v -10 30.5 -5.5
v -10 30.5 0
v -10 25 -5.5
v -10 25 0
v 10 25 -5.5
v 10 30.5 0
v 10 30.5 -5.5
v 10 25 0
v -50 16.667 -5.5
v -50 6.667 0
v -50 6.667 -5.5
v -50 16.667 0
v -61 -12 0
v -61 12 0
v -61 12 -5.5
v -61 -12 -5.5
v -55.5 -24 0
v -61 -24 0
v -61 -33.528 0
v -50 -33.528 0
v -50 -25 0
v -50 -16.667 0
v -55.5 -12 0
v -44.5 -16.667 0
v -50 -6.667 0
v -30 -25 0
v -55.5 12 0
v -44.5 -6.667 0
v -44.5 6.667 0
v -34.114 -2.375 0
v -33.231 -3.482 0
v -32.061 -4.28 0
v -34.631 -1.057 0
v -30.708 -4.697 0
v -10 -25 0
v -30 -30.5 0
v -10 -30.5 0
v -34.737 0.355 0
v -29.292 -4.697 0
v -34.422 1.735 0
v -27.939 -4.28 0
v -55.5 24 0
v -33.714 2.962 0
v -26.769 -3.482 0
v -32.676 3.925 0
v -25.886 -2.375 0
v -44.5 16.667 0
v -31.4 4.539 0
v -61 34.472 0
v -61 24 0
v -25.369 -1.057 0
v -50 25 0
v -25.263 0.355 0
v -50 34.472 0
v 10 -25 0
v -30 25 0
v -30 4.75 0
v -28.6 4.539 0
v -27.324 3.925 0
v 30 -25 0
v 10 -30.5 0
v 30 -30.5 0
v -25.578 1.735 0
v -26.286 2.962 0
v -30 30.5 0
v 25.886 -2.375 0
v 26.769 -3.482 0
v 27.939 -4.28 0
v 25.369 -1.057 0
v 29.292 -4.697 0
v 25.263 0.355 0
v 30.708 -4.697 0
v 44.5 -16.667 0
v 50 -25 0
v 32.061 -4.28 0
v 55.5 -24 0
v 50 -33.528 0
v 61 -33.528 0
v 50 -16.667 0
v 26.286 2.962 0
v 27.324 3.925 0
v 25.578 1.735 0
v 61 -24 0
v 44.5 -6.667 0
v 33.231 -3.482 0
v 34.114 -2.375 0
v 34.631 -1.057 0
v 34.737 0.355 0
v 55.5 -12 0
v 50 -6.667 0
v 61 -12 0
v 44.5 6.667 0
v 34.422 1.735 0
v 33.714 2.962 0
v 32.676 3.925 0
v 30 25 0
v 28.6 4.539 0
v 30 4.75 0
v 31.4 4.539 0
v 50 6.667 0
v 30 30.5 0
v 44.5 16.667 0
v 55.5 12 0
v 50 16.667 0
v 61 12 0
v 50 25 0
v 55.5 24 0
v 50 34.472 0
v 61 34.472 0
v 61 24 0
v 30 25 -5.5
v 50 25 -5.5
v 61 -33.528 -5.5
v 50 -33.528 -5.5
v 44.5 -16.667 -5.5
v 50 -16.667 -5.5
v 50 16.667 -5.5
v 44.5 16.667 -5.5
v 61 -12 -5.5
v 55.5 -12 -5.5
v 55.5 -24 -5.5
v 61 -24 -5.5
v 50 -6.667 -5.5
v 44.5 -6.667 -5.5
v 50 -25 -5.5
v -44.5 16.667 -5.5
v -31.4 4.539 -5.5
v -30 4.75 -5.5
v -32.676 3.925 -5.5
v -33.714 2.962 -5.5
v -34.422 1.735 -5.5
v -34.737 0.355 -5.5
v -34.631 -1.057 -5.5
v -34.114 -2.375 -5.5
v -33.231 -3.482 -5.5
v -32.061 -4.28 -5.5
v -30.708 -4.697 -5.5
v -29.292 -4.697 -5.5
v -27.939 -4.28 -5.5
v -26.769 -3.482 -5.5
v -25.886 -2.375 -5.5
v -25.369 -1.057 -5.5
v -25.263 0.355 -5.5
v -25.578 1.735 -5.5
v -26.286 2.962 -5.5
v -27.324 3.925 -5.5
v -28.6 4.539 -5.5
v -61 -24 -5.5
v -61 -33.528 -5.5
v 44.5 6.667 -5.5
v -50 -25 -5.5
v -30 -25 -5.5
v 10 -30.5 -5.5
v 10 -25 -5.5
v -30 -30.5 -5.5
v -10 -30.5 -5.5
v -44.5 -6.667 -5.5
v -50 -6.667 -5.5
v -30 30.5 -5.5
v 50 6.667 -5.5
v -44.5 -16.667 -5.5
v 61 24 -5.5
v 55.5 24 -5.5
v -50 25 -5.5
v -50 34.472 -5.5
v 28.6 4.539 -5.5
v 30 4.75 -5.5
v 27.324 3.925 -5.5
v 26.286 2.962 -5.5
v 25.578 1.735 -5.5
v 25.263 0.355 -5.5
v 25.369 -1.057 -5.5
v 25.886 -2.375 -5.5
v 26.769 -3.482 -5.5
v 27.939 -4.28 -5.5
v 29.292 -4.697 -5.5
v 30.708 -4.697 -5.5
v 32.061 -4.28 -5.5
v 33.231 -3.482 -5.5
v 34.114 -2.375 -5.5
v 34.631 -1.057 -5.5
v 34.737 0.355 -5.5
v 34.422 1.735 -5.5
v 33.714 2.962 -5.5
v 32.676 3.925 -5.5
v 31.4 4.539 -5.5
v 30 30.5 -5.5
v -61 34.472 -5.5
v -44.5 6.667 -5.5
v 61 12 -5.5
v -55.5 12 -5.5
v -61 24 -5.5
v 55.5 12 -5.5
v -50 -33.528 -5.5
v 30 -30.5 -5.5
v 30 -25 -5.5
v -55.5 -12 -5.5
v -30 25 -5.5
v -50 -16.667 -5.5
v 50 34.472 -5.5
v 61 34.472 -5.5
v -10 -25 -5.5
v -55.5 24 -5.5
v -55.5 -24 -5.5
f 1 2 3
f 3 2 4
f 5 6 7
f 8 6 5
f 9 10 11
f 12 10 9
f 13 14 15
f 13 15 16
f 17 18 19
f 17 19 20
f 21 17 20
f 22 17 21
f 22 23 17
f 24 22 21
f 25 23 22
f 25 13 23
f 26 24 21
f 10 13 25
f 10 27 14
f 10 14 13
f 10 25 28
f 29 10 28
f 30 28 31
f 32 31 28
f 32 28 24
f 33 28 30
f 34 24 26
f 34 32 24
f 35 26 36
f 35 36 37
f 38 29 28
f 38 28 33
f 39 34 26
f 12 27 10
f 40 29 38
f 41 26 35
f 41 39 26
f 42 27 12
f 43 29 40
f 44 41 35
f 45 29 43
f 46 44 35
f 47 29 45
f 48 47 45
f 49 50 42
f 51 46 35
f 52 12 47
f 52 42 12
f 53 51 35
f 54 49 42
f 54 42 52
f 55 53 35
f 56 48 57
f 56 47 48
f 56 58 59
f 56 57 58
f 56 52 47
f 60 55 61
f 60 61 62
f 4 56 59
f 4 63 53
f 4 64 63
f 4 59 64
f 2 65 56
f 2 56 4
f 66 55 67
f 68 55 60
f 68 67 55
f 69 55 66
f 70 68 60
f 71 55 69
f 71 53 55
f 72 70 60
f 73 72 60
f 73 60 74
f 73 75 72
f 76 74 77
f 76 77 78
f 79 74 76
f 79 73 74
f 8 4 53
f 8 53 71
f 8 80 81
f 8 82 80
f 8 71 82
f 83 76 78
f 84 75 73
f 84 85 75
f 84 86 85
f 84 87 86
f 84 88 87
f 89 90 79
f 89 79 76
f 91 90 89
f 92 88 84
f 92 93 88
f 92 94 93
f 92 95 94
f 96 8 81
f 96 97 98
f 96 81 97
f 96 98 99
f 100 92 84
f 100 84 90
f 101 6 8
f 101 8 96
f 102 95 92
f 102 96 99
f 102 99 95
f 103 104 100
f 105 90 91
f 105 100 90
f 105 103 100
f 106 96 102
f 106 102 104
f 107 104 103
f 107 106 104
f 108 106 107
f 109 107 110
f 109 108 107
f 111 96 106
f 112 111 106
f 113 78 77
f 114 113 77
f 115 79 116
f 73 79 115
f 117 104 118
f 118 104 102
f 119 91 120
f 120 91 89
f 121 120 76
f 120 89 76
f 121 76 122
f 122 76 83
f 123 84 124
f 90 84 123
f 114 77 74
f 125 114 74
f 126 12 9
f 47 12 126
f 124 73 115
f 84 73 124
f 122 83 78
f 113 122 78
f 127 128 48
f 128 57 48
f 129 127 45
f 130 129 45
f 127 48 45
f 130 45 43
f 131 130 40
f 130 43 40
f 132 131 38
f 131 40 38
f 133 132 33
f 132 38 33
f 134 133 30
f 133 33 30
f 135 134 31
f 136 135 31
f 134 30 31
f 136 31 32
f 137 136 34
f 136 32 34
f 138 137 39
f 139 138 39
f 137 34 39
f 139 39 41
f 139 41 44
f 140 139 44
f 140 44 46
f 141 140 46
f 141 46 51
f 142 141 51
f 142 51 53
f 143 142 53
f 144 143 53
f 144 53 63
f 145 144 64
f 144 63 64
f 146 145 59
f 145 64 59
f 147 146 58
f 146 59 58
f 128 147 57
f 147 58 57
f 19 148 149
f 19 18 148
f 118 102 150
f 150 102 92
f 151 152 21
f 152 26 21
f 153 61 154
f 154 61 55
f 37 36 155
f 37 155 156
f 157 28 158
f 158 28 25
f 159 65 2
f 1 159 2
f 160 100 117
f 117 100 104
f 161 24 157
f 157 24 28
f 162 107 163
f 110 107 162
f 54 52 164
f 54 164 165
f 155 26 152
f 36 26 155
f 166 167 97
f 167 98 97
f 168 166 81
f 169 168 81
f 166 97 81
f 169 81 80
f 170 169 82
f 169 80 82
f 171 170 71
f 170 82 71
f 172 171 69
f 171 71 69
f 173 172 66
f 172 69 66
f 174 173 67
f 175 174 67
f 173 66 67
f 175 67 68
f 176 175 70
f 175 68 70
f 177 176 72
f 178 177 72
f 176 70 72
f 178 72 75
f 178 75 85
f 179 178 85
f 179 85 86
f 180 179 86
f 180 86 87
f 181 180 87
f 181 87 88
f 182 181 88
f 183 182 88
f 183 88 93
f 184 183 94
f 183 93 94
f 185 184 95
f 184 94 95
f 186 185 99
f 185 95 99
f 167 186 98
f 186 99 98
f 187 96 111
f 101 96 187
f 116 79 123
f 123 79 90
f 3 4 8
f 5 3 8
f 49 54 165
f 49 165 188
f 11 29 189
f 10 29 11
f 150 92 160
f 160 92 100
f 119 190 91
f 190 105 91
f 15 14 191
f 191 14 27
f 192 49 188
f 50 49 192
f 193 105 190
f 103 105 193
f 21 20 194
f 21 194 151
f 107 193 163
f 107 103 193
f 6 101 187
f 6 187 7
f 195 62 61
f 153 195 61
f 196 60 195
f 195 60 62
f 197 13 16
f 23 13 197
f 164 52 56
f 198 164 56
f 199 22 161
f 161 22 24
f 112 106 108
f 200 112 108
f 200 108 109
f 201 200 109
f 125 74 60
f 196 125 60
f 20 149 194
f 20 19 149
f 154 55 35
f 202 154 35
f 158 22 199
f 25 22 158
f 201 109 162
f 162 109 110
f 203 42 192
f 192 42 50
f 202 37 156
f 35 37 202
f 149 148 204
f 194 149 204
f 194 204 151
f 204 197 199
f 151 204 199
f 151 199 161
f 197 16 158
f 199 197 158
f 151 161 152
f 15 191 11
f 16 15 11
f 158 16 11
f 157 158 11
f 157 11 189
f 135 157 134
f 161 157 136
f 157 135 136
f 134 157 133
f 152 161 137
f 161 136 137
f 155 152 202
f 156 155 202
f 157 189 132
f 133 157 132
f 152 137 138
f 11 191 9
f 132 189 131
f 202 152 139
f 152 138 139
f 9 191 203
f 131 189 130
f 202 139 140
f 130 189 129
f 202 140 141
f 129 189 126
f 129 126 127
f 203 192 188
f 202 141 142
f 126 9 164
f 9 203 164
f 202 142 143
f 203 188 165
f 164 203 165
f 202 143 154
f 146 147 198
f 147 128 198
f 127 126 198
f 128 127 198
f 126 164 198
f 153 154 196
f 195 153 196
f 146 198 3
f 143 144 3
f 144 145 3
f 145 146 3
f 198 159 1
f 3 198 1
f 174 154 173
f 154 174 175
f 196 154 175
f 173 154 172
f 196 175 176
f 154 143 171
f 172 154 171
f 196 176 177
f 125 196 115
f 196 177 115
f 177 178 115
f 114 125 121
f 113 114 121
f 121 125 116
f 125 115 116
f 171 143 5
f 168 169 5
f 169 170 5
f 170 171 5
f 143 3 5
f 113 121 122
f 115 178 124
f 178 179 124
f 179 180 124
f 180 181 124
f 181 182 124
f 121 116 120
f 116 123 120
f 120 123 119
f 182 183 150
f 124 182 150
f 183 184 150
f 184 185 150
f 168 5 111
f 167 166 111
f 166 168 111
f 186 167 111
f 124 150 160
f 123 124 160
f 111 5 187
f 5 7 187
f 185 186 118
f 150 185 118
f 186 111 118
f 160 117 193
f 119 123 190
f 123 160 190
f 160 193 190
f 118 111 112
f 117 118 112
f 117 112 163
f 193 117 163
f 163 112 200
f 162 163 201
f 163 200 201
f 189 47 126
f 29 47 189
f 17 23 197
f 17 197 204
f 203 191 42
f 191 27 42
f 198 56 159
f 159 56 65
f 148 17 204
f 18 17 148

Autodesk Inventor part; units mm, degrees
ref_plane "YZ Plane" through (0, 0, 0) normal (1, 0, 0) x (0, 1, 0)
ref_plane "XZ Plane" through (0, 0, 0) normal (0, 1, 0) x (-1, 0, 0)
ref_plane "XY Plane" through (0, 0, 0) normal (0, 0, 1) x (1, 0, 0)
sketch "Block1" plane through (0, 0, 0) normal (0, 0, 1) x (1, 0, 0)
  line L0 (-30.1, 34.1) -> (-9.9, 34.1)
  line L1 (-9.9, 34.1) -> (-9.9, 25.1)
  line L2 (-9.9, 25.1) -> (9.9, 25.1)
  line L3 (9.9, 25.1) -> (9.9, 34.1)
  line L4 (9.9, 34.1) -> (30.1, 34.1)
  line L5 (30.1, 34.1) -> (30.1, 25.1)
  line L6 (30.1, 25.1) -> (49.9, 25.1)
  line L7 (49.9, 25.1) -> (49.9, 34.5715)
  line L8 (49.9, 34.5715) -> (61.1, 34.5715)
  line L9 (61.1, 34.5715) -> (61.1, 23.9)
  line L10 (61.1, 23.9) -> (52.1, 23.9)
  line L11 (52.1, 23.9) -> (52.1, 12.1)
  line L12 (52.1, 12.1) -> (61.1, 12.1)
  line L13 (61.1, 12.1) -> (61.1, -12.1)
  line L14 (61.1, -12.1) -> (52.1, -12.1)
  line L15 (52.1, -12.1) -> (52.1, -23.9)
  line L16 (52.1, -23.9) -> (61.1, -23.9)
  line L17 (61.1, -23.9) -> (61.1, -33.6285)
  line L18 (61.1, -33.6285) -> (49.9, -33.6285)
  line L19 (49.9, -33.6285) -> (49.9, -25.1)
  line L20 (49.9, -25.1) -> (30.1, -25.1)
  line L21 (30.1, -25.1) -> (30.1, -34.1)
  line L22 (30.1, -34.1) -> (9.9, -34.1)
  line L23 (9.9, -34.1) -> (9.9, -25.1)
  line L24 (9.9, -25.1) -> (-9.9, -25.1)
  line L25 (-9.9, -25.1) -> (-9.9, -34.1)
  line L26 (-9.9, -34.1) -> (-30.1, -34.1)
  line L27 (-30.1, -34.1) -> (-30.1, -25.1)
  line L28 (-30.1, -25.1) -> (-49.9, -25.1)
  line L29 (-49.9, -25.1) -> (-49.9, -33.6285)
  line L30 (-49.9, -33.6285) -> (-61.1, -33.6285)
  line L31 (-61.1, -33.6285) -> (-61.1, -23.9)
  line L32 (-61.1, -23.9) -> (-52.1, -23.9)
  line L33 (-52.1, -23.9) -> (-52.1, -12.1)
  line L34 (-52.1, -12.1) -> (-61.1, -12.1)
  line L35 (-61.1, -12.1) -> (-61.1, 12.1)
  line L36 (-61.1, 12.1) -> (-52.1, 12.1)
  line L37 (-52.1, 12.1) -> (-52.1, 23.9)
  line L38 (-52.1, 23.9) -> (-61.1, 23.9)
  line L39 (-61.1, 23.9) -> (-61.1, 34.5715)
  line L40 (-61.1, 34.5715) -> (-49.9, 34.5715)
  line L41 (-49.9, 34.5715) -> (-49.9, 25.1)
  line L42 (-49.9, 25.1) -> (-30.1, 25.1)
  line L43 (-30.1, 25.1) -> (-30.1, 34.1)
  line L44 (-40.9, 16.7667) -> (-50.1, 16.7667)
  line L45 (-50.1, 16.7667) -> (-50.1, 6.5667)
  line L46 (-50.1, 6.5667) -> (-40.9, 6.5667)
  line L47 (-40.9, 6.5667) -> (-40.9, 16.7667)
  line L48 (-40.9, -6.5667) -> (-50.1, -6.5667)
  line L49 (-50.1, -6.5667) -> (-50.1, -16.7667)
  line L50 (-50.1, -16.7667) -> (-40.9, -16.7667)
  line L51 (-40.9, -16.7667) -> (-40.9, -6.5667)
  circle A0 centre (-30, 0) radius 4.6
  circle A1 centre (30, 0) radius 4.6
  line L52 (50.1, 16.7667) -> (50.1, 6.5667)
  line L53 (50.1, 6.5667) -> (40.9, 6.5667)
  line L54 (40.9, 6.5667) -> (40.9, 16.7667)
  line L55 (40.9, 16.7667) -> (50.1, 16.7667)
  line L56 (50.1, -6.5667) -> (40.9, -6.5667)
  line L57 (40.9, -6.5667) -> (40.9, -16.7667)
  line L58 (40.9, -16.7667) -> (50.1, -16.7667)
  line L59 (50.1, -16.7667) -> (50.1, -6.5667)
  point P0 (0, 0.0615)
sketch "Block2" plane through (0, 0, 0) normal (0, 0, 1) x (1, 0, 0)
  line L0 (-30.2, 34.2) -> (-9.8, 34.2)
  line L1 (-9.8, 34.2) -> (-9.8, 25.2)
  line L2 (-9.8, 25.2) -> (9.8, 25.2)
  line L3 (9.8, 25.2) -> (9.8, 34.2)
  line L4 (9.8, 34.2) -> (30.2, 34.2)
  line L5 (30.2, 34.2) -> (30.2, 25.2)
  line L6 (30.2, 25.2) -> (49.8, 25.2)
  line L7 (49.8, 25.2) -> (49.8, 34.6715)
  line L8 (49.8, 34.6715) -> (61.2, 34.6715)
  line L9 (61.2, 34.6715) -> (61.2, 23.8)
  line L10 (61.2, 23.8) -> (52.2, 23.8)
  line L11 (52.2, 23.8) -> (52.2, 12.2)
  line L12 (52.2, 12.2) -> (61.2, 12.2)
  line L13 (61.2, 12.2) -> (61.2, -12.2)
  line L14 (61.2, -12.2) -> (52.2, -12.2)
  line L15 (52.2, -12.2) -> (52.2, -23.8)
  line L16 (52.2, -23.8) -> (61.2, -23.8)
  line L17 (61.2, -23.8) -> (61.2, -33.7285)
  line L18 (61.2, -33.7285) -> (49.8, -33.7285)
  line L19 (49.8, -33.7285) -> (49.8, -25.2)
  line L20 (49.8, -25.2) -> (30.2, -25.2)
  line L21 (30.2, -25.2) -> (30.2, -34.2)
  line L22 (30.2, -34.2) -> (9.8, -34.2)
  line L23 (9.8, -34.2) -> (9.8, -25.2)
  line L24 (9.8, -25.2) -> (-9.8, -25.2)
  line L25 (-9.8, -25.2) -> (-9.8, -34.2)
  line L26 (-9.8, -34.2) -> (-30.2, -34.2)
  line L27 (-30.2, -34.2) -> (-30.2, -25.2)
  line L28 (-30.2, -25.2) -> (-49.8, -25.2)
  line L29 (-49.8, -25.2) -> (-49.8, -33.7285)
  line L30 (-49.8, -33.7285) -> (-61.2, -33.7285)
  line L31 (-61.2, -33.7285) -> (-61.2, -23.8)
  line L32 (-61.2, -23.8) -> (-52.2, -23.8)
  line L33 (-52.2, -23.8) -> (-52.2, -12.2)
  line L34 (-52.2, -12.2) -> (-61.2, -12.2)
  line L35 (-61.2, -12.2) -> (-61.2, 12.2)
  line L36 (-61.2, 12.2) -> (-52.2, 12.2)
  line L37 (-52.2, 12.2) -> (-52.2, 23.8)
  line L38 (-52.2, 23.8) -> (-61.2, 23.8)
  line L39 (-61.2, 23.8) -> (-61.2, 34.6715)
  line L40 (-61.2, 34.6715) -> (-49.8, 34.6715)
  line L41 (-49.8, 34.6715) -> (-49.8, 25.2)
  line L42 (-49.8, 25.2) -> (-30.2, 25.2)
  line L43 (-30.2, 25.2) -> (-30.2, 34.2)
  circle A0 centre (-30, 0) radius 4.7
  circle A1 centre (30, 0) radius 4.7
  line L44 (50.2, 16.8667) -> (50.2, 6.4667)
  line L45 (50.2, 6.4667) -> (40.8, 6.4667)
  line L46 (40.8, 6.4667) -> (40.8, 16.8667)
  line L47 (40.8, 16.8667) -> (50.2, 16.8667)
  line L48 (50.2, -6.4667) -> (40.8, -6.4667)
  line L49 (40.8, -6.4667) -> (40.8, -16.8667)
  line L50 (40.8, -16.8667) -> (50.2, -16.8667)
  line L51 (50.2, -16.8667) -> (50.2, -6.4667)
  line L52 (-40.8, 16.8667) -> (-50.2, 16.8667)
  line L53 (-50.2, 16.8667) -> (-50.2, 6.4667)
  line L54 (-50.2, 6.4667) -> (-40.8, 6.4667)
  line L55 (-40.8, 6.4667) -> (-40.8, 16.8667)
  line L56 (-40.8, -6.4667) -> (-50.2, -6.4667)
  line L57 (-50.2, -6.4667) -> (-50.2, -16.8667)
  line L58 (-50.2, -16.8667) -> (-40.8, -16.8667)
  line L59 (-40.8, -16.8667) -> (-40.8, -6.4667)
  point P0 (0, 0.0615)
sketch "Block3" plane through (0, 0, 0) normal (0, 0, 1) x (1, 0, 0)
  line L0 (9.9, 34.1) -> (30.1, 34.1)
  line L1 (30.1, 34.1) -> (30.1, 25.1)
  line L2 (30.1, 25.1) -> (49.9, 25.1)
  line L3 (49.9, 25.1) -> (49.9, 34.5715)
  line L4 (49.9, 34.5715) -> (61.1, 34.5715)
  line L5 (61.1, 34.5715) -> (61.1, 23.9)
  line L6 (61.1, 23.9) -> (52.1, 23.9)
  line L7 (52.1, 23.9) -> (52.1, 12.1)
  line L8 (52.1, 12.1) -> (61.1, 12.1)
  line L9 (61.1, 12.1) -> (61.1, -12.1)
  line L10 (61.1, -12.1) -> (52.1, -12.1)
  line L11 (52.1, -12.1) -> (52.1, -23.9)
  line L12 (52.1, -23.9) -> (61.1, -23.9)
  line L13 (61.1, -23.9) -> (61.1, -33.6285)
  line L14 (61.1, -33.6285) -> (49.9, -33.6285)
  line L15 (49.9, -33.6285) -> (49.9, -25.1)
  line L16 (49.9, -25.1) -> (30.1, -25.1)
  line L17 (30.1, -25.1) -> (30.1, -34.1)
  line L18 (30.1, -34.1) -> (9.9, -34.1)
  line L19 (9.9, -34.1) -> (9.9, -25.1)
  line L20 (9.9, -25.1) -> (-9.9, -25.1)
  line L21 (-9.9, -25.1) -> (-9.9, -34.1)
  line L22 (-9.9, -34.1) -> (-30.1, -34.1)
  line L23 (-30.1, -34.1) -> (-30.1, -25.1)
  line L24 (-30.1, -25.1) -> (-49.9, -25.1)
  line L25 (-49.9, -25.1) -> (-49.9, -33.6285)
  line L26 (-49.9, -33.6285) -> (-61.1, -33.6285)
  line L27 (-61.1, -33.6285) -> (-61.1, -23.9)
  line L28 (-61.1, -23.9) -> (-52.1, -23.9)
  line L29 (-52.1, -23.9) -> (-52.1, -12.1)
  line L30 (-52.1, -12.1) -> (-61.1, -12.1)
  line L31 (-61.1, -12.1) -> (-61.1, 12.1)
  line L32 (-61.1, 12.1) -> (-52.1, 12.1)
  line L33 (-52.1, 12.1) -> (-52.1, 23.9)
  line L34 (-52.1, 23.9) -> (-61.1, 23.9)
  line L35 (-61.1, 23.9) -> (-61.1, 34.5715)
  line L36 (-61.1, 34.5715) -> (-49.9, 34.5715)
  line L37 (-49.9, 34.5715) -> (-49.9, 25.1)
  line L38 (-49.9, 25.1) -> (-30.1, 25.1)
  line L39 (-30.1, 25.1) -> (-30.1, 34.1)
  line L40 (-30.1, 34.1) -> (-9.9, 34.1)
  line L41 (-9.9, 34.1) -> (-9.9, 25.1)
  line L42 (-9.9, 25.1) -> (9.9, 25.1)
  line L43 (9.9, 25.1) -> (9.9, 34.1)
  circle A0 centre (-30, 0) radius 4.6
  circle A1 centre (30, 0) radius 4.6
  line L44 (-40.9, 16.7667) -> (-50.1, 16.7667)
  line L45 (-50.1, 16.7667) -> (-50.1, 6.5667)
  line L46 (-50.1, 6.5667) -> (-40.9, 6.5667)
  line L47 (-40.9, 6.5667) -> (-40.9, 16.7667)
  line L48 (-40.9, -6.5667) -> (-50.1, -6.5667)
  line L49 (-50.1, -6.5667) -> (-50.1, -16.7667)
  line L50 (-50.1, -16.7667) -> (-40.9, -16.7667)
  line L51 (-40.9, -16.7667) -> (-40.9, -6.5667)
  line L52 (50.1, 16.7667) -> (50.1, 6.5667)
  line L53 (50.1, 6.5667) -> (40.9, 6.5667)
  line L54 (40.9, 6.5667) -> (40.9, 16.7667)
  line L55 (40.9, 16.7667) -> (50.1, 16.7667)
  line L56 (50.1, -6.5667) -> (40.9, -6.5667)
  line L57 (40.9, -6.5667) -> (40.9, -16.7667)
  line L58 (40.9, -16.7667) -> (50.1, -16.7667)
  line L59 (50.1, -16.7667) -> (50.1, -6.5667)
  point P0 (0, 0.0615)
sketch "Block4" plane through (0, 0, 0) normal (0, 0, 1) x (1, 0, 0)
  line L0 (-30.08, 30.58) -> (-9.92, 30.58)
  line L1 (-9.92, 30.58) -> (-9.92, 25.08)
  line L2 (-9.92, 25.08) -> (9.92, 25.08)
  line L3 (9.92, 25.08) -> (9.92, 30.58)
  line L4 (9.92, 30.58) -> (30.08, 30.58)
  line L5 (30.08, 30.58) -> (30.08, 25.08)
  line L6 (30.08, 25.08) -> (49.92, 25.08)
  line L7 (49.92, 25.08) -> (49.92, 34.5515)
  line L8 (49.92, 34.5515) -> (61.08, 34.5515)
  line L9 (61.08, 34.5515) -> (61.08, 23.92)
  line L10 (61.08, 23.92) -> (55.58, 23.92)
  line L11 (55.58, 23.92) -> (55.58, 12.08)
  line L12 (55.58, 12.08) -> (61.08, 12.08)
  line L13 (61.08, 12.08) -> (61.08, -12.08)
  line L14 (61.08, -12.08) -> (55.58, -12.08)
  line L15 (55.58, -12.08) -> (55.58, -23.92)
  line L16 (55.58, -23.92) -> (61.08, -23.92)
  line L17 (61.08, -23.92) -> (61.08, -33.6085)
  line L18 (61.08, -33.6085) -> (49.92, -33.6085)
  line L19 (49.92, -33.6085) -> (49.92, -25.08)
  line L20 (49.92, -25.08) -> (30.08, -25.08)
  line L21 (30.08, -25.08) -> (30.08, -30.58)
  line L22 (30.08, -30.58) -> (9.92, -30.58)
  line L23 (9.92, -30.58) -> (9.92, -25.08)
  line L24 (9.92, -25.08) -> (-9.92, -25.08)
  line L25 (-9.92, -25.08) -> (-9.92, -30.58)
  line L26 (-9.92, -30.58) -> (-30.08, -30.58)
  line L27 (-30.08, -30.58) -> (-30.08, -25.08)
  line L28 (-30.08, -25.08) -> (-49.92, -25.08)
  line L29 (-49.92, -25.08) -> (-49.92, -33.6085)
  line L30 (-49.92, -33.6085) -> (-61.08, -33.6085)
  line L31 (-61.08, -33.6085) -> (-61.08, -23.92)
  line L32 (-61.08, -23.92) -> (-55.58, -23.92)
  line L33 (-55.58, -23.92) -> (-55.58, -12.08)
  line L34 (-55.58, -12.08) -> (-61.08, -12.08)
  line L35 (-61.08, -12.08) -> (-61.08, 12.08)
  line L36 (-61.08, 12.08) -> (-55.58, 12.08)
  line L37 (-55.58, 12.08) -> (-55.58, 23.92)
  line L38 (-55.58, 23.92) -> (-61.08, 23.92)
  line L39 (-61.08, 23.92) -> (-61.08, 34.5515)
  line L40 (-61.08, 34.5515) -> (-49.92, 34.5515)
  line L41 (-49.92, 34.5515) -> (-49.92, 25.08)
  line L42 (-49.92, 25.08) -> (-30.08, 25.08)
  line L43 (-30.08, 25.08) -> (-30.08, 30.58)
  line L44 (-44.42, 16.7467) -> (-50.08, 16.7467)
  line L45 (-50.08, 16.7467) -> (-50.08, 6.5867)
  line L46 (-50.08, 6.5867) -> (-44.42, 6.5867)
  line L47 (-44.42, 6.5867) -> (-44.42, 16.7467)
  line L48 (-44.42, -6.5867) -> (-50.08, -6.5867)
  line L49 (-50.08, -6.5867) -> (-50.08, -16.7467)
  line L50 (-50.08, -16.7467) -> (-44.42, -16.7467)
  line L51 (-44.42, -16.7467) -> (-44.42, -6.5867)
  circle A0 centre (-30, 0) radius 4.83
  circle A1 centre (30, 0) radius 4.83
  line L52 (50.08, 16.7467) -> (50.08, 6.5867)
  line L53 (50.08, 6.5867) -> (44.42, 6.5867)
  line L54 (44.42, 6.5867) -> (44.42, 16.7467)
  line L55 (44.42, 16.7467) -> (50.08, 16.7467)
  line L56 (50.08, -6.5867) -> (44.42, -6.5867)
  line L57 (44.42, -6.5867) -> (44.42, -16.7467)
  line L58 (44.42, -16.7467) -> (50.08, -16.7467)
  line L59 (50.08, -16.7467) -> (50.08, -6.5867)
  point P0 (0, 0.0615)
sketch "Sketch10" plane through (0, 0, 0) normal (0, 0, 1) x (1, 0, 0)
  line L0 (50, -25) -> (-50, -25)
  line L1 (-50, -25) -> (-50, 25)
  line L2 (-50, 25) -> (50, 25)
  line L3 (50, 25) -> (50, -25)
  line L4 (50, -25) -> (-50, 25) construction
  line L5 (-50, -25) -> (50, 25) construction
  point P0 (0, 0)
  dimension "d21" = 100
  dimension "d22" = 50
extrude "Extrusion2" add sketch "Sketch10" against normal blind 5.5
sketch "Sketch16" plane through (0, 0, -5.5) normal (0, 0, -1) x (-1, 0, 0)
  line L0 (0, -48.2244) -> (0, 50.6464) projected
  point P0 (0, 0)
  point P1 (-30, 0)
  point P2 (30, 0)
  dimension "d52" = 60
hole "Hole5" at (30, 0, -5.5) at (-30, 0, -5.5) direction (0, 0, 1) diameter 9.5 end through all
sketch "Sketch35" plane through (0, 0, 0) normal (0, 0, 1) x (1, 0, 0)
  line L0 (-50, 25) -> (50, 25) projected
  line L1 (-50, -25) -> (-50, 25) projected
  line L2 (0, -48.2244) -> (0, 50.6464) projected
  line L3 (-246.2787, 0) -> (113.734, 0) projected
  line L4 (50, 25) -> (50, -25) projected
  line L5 (-30, 25) -> (-30, 30.5)
  line L6 (-30, 30.5) -> (-10, 30.5)
  line L7 (-10, 30.5) -> (-10, 25)
  line L8 (-30, 25) -> (-10, 25)
  line L9 (30, 25) -> (30, 30.5)
  line L10 (30, 30.5) -> (10, 30.5)
  line L11 (10, 30.5) -> (10, 25)
  line L12 (30, 25) -> (10, 25)
  line L13 (-30, -25) -> (-30, -30.5)
  line L14 (-30, -30.5) -> (-10, -30.5)
  line L15 (-10, -30.5) -> (-10, -25)
  line L16 (-30, -25) -> (-10, -25)
  line L17 (30, -25) -> (30, -30.5)
  line L18 (30, -25) -> (10, -25)
  line L19 (30, -30.5) -> (10, -30.5)
  line L20 (10, -30.5) -> (10, -25)
  point P0 (0, 0)
  point P1 (-50, 16.6667)
  point P2 (-50, 4.1667)
  dimension "d129" = 20
  dimension "d130" = 20
  dimension "d131" = 5.5
extrude "Extrusion6" add sketch "Sketch35" against normal blind 5.5 contours L5 L6 L7 L0 | L11 L10 L9 L0 | L16 L15 L14 L13 | L17 L19 L20 L18
sketch "Sketch36" plane through (0, 0, 0) normal (0, 0, 1) x (1, 0, 0)
  line L0 (-50, 25) -> (-30, 25) projected
  line L1 (-50, -25) -> (-50, 25) projected
  line L2 (-50, 16.6667) -> (-44.5, 16.6667)
  line L3 (-44.5, 16.6667) -> (-44.5, 6.6667)
  line L4 (-44.5, 6.6667) -> (-50, 6.6667)
  line L5 (-50, 6.6667) -> (-50, 16.6667)
  line L6 (-246.2787, 0) -> (113.734, 0) projected
  line L7 (0, -48.2244) -> (0, 50.6464) projected
  line L8 (-50, -16.6667) -> (-44.5, -16.6667)
  line L9 (-44.5, -16.6667) -> (-44.5, -6.6667)
  line L10 (-44.5, -6.6667) -> (-50, -6.6667)
  line L11 (-50, -6.6667) -> (-50, -16.6667)
  line L12 (50, 16.6667) -> (44.5, 16.6667)
  line L13 (44.5, 16.6667) -> (44.5, 6.6667)
  line L14 (44.5, 6.6667) -> (50, 6.6667)
  line L15 (50, 6.6667) -> (50, 16.6667)
  line L16 (44.5, -16.6667) -> (44.5, -6.6667)
  line L17 (44.5, -6.6667) -> (50, -6.6667)
  line L18 (50, -6.6667) -> (50, -16.6667)
  line L19 (50, -16.6667) -> (44.5, -16.6667)
  point P0 (0, 0)
  dimension "d144" = 5.5
  dimension "d145" = 10
  dimension "d146" = 8.3333
extrude "Extrusion7" cut sketch "Sketch36" against normal through all
sketch "Sketch37" plane through (0, 0, 0) normal (0, 0, 1) x (1, 0, 0)
  line L0 (30, -30.5) -> (10, -30.5)
  line L1 (-10, -30.5) -> (-30, -30.5)
  line L2 (0, -48.2244) -> (0, 50.6464) projected
  line L3 (-50, 34.4715) -> (-61, 34.4715)
  line L4 (-61, 34.4715) -> (-61, -33.5285)
  line L5 (-61, -33.5285) -> (-50, -33.5285)
  line L6 (-50, -33.5285) -> (-50, 34.4715)
  line L7 (50, 16.6667) -> (50, 25)
  line L8 (50, -6.6667) -> (50, 6.6667)
  line L9 (50, -25) -> (50, -16.6667)
  line L10 (50, 34.4715) -> (61, 34.4715)
  line L11 (61, 34.4715) -> (61, -33.5285)
  line L12 (61, -33.5285) -> (50, -33.5285)
  line L13 (50, -33.5285) -> (50, 34.4715)
  point P0 (0, 0)
  dimension "d155" = 11
extrude "Extrusion8" add sketch "Sketch37" against normal blind 5.5
sketch "Sketch38" plane through (0, 0, 0) normal (0, 0, 1) x (1, 0, 0)
  line L0 (-61, 34.4715) -> (-61, -33.5285) projected
  line L1 (-246.2787, 0) -> (113.734, 0) projected
  line L2 (0, -48.2244) -> (0, 50.6464) projected
  line L3 (-61, 12) -> (-55.5, 12)
  line L4 (-55.5, 12) -> (-55.5, 24)
  line L5 (-55.5, 24) -> (-61, 24)
  line L6 (-61, 24) -> (-61, 12)
  line L7 (-61, -12) -> (-55.5, -12)
  line L8 (-55.5, -12) -> (-55.5, -24)
  line L9 (-55.5, -24) -> (-61, -24)
  line L10 (-61, -24) -> (-61, -12)
  line L11 (61, 12) -> (55.5, 12)
  line L12 (55.5, 12) -> (55.5, 24)
  line L13 (55.5, 24) -> (61, 24)
  line L14 (61, 24) -> (61, 12)
  line L15 (55.5, -12) -> (55.5, -24)
  line L16 (55.5, -24) -> (61, -24)
  line L17 (61, -24) -> (61, -12)
  line L18 (61, -12) -> (55.5, -12)
  point P0 (0, 0)
  dimension "d164" = 5.5
  dimension "d165" = 12
  dimension "d166" = 12
extrude "Extrusion10" cut sketch "Sketch38" against normal through all
equation "\"d23\" = Wt"
equation "\"d129\" = 0.2 * d21"
equation "\"d130\" = 0.2 * d21"
equation "\"d131\" = Wt"
equation "\"d142\" = Wt"
equation "\"d144\" = Wt"
equation "\"d145\" = 0.2 * d22"
equation "\"d146\" = 0.166667 * d22"
equation "\"d147\" = Wt"
equation "\"d162\" = Wt"
equation "\"d164\" = Wt"
equation "\"d172\" = Wt"
equation "\"Wt\" = 5.5"
properties part number "holder_plate" material "Wood (Birch)"
